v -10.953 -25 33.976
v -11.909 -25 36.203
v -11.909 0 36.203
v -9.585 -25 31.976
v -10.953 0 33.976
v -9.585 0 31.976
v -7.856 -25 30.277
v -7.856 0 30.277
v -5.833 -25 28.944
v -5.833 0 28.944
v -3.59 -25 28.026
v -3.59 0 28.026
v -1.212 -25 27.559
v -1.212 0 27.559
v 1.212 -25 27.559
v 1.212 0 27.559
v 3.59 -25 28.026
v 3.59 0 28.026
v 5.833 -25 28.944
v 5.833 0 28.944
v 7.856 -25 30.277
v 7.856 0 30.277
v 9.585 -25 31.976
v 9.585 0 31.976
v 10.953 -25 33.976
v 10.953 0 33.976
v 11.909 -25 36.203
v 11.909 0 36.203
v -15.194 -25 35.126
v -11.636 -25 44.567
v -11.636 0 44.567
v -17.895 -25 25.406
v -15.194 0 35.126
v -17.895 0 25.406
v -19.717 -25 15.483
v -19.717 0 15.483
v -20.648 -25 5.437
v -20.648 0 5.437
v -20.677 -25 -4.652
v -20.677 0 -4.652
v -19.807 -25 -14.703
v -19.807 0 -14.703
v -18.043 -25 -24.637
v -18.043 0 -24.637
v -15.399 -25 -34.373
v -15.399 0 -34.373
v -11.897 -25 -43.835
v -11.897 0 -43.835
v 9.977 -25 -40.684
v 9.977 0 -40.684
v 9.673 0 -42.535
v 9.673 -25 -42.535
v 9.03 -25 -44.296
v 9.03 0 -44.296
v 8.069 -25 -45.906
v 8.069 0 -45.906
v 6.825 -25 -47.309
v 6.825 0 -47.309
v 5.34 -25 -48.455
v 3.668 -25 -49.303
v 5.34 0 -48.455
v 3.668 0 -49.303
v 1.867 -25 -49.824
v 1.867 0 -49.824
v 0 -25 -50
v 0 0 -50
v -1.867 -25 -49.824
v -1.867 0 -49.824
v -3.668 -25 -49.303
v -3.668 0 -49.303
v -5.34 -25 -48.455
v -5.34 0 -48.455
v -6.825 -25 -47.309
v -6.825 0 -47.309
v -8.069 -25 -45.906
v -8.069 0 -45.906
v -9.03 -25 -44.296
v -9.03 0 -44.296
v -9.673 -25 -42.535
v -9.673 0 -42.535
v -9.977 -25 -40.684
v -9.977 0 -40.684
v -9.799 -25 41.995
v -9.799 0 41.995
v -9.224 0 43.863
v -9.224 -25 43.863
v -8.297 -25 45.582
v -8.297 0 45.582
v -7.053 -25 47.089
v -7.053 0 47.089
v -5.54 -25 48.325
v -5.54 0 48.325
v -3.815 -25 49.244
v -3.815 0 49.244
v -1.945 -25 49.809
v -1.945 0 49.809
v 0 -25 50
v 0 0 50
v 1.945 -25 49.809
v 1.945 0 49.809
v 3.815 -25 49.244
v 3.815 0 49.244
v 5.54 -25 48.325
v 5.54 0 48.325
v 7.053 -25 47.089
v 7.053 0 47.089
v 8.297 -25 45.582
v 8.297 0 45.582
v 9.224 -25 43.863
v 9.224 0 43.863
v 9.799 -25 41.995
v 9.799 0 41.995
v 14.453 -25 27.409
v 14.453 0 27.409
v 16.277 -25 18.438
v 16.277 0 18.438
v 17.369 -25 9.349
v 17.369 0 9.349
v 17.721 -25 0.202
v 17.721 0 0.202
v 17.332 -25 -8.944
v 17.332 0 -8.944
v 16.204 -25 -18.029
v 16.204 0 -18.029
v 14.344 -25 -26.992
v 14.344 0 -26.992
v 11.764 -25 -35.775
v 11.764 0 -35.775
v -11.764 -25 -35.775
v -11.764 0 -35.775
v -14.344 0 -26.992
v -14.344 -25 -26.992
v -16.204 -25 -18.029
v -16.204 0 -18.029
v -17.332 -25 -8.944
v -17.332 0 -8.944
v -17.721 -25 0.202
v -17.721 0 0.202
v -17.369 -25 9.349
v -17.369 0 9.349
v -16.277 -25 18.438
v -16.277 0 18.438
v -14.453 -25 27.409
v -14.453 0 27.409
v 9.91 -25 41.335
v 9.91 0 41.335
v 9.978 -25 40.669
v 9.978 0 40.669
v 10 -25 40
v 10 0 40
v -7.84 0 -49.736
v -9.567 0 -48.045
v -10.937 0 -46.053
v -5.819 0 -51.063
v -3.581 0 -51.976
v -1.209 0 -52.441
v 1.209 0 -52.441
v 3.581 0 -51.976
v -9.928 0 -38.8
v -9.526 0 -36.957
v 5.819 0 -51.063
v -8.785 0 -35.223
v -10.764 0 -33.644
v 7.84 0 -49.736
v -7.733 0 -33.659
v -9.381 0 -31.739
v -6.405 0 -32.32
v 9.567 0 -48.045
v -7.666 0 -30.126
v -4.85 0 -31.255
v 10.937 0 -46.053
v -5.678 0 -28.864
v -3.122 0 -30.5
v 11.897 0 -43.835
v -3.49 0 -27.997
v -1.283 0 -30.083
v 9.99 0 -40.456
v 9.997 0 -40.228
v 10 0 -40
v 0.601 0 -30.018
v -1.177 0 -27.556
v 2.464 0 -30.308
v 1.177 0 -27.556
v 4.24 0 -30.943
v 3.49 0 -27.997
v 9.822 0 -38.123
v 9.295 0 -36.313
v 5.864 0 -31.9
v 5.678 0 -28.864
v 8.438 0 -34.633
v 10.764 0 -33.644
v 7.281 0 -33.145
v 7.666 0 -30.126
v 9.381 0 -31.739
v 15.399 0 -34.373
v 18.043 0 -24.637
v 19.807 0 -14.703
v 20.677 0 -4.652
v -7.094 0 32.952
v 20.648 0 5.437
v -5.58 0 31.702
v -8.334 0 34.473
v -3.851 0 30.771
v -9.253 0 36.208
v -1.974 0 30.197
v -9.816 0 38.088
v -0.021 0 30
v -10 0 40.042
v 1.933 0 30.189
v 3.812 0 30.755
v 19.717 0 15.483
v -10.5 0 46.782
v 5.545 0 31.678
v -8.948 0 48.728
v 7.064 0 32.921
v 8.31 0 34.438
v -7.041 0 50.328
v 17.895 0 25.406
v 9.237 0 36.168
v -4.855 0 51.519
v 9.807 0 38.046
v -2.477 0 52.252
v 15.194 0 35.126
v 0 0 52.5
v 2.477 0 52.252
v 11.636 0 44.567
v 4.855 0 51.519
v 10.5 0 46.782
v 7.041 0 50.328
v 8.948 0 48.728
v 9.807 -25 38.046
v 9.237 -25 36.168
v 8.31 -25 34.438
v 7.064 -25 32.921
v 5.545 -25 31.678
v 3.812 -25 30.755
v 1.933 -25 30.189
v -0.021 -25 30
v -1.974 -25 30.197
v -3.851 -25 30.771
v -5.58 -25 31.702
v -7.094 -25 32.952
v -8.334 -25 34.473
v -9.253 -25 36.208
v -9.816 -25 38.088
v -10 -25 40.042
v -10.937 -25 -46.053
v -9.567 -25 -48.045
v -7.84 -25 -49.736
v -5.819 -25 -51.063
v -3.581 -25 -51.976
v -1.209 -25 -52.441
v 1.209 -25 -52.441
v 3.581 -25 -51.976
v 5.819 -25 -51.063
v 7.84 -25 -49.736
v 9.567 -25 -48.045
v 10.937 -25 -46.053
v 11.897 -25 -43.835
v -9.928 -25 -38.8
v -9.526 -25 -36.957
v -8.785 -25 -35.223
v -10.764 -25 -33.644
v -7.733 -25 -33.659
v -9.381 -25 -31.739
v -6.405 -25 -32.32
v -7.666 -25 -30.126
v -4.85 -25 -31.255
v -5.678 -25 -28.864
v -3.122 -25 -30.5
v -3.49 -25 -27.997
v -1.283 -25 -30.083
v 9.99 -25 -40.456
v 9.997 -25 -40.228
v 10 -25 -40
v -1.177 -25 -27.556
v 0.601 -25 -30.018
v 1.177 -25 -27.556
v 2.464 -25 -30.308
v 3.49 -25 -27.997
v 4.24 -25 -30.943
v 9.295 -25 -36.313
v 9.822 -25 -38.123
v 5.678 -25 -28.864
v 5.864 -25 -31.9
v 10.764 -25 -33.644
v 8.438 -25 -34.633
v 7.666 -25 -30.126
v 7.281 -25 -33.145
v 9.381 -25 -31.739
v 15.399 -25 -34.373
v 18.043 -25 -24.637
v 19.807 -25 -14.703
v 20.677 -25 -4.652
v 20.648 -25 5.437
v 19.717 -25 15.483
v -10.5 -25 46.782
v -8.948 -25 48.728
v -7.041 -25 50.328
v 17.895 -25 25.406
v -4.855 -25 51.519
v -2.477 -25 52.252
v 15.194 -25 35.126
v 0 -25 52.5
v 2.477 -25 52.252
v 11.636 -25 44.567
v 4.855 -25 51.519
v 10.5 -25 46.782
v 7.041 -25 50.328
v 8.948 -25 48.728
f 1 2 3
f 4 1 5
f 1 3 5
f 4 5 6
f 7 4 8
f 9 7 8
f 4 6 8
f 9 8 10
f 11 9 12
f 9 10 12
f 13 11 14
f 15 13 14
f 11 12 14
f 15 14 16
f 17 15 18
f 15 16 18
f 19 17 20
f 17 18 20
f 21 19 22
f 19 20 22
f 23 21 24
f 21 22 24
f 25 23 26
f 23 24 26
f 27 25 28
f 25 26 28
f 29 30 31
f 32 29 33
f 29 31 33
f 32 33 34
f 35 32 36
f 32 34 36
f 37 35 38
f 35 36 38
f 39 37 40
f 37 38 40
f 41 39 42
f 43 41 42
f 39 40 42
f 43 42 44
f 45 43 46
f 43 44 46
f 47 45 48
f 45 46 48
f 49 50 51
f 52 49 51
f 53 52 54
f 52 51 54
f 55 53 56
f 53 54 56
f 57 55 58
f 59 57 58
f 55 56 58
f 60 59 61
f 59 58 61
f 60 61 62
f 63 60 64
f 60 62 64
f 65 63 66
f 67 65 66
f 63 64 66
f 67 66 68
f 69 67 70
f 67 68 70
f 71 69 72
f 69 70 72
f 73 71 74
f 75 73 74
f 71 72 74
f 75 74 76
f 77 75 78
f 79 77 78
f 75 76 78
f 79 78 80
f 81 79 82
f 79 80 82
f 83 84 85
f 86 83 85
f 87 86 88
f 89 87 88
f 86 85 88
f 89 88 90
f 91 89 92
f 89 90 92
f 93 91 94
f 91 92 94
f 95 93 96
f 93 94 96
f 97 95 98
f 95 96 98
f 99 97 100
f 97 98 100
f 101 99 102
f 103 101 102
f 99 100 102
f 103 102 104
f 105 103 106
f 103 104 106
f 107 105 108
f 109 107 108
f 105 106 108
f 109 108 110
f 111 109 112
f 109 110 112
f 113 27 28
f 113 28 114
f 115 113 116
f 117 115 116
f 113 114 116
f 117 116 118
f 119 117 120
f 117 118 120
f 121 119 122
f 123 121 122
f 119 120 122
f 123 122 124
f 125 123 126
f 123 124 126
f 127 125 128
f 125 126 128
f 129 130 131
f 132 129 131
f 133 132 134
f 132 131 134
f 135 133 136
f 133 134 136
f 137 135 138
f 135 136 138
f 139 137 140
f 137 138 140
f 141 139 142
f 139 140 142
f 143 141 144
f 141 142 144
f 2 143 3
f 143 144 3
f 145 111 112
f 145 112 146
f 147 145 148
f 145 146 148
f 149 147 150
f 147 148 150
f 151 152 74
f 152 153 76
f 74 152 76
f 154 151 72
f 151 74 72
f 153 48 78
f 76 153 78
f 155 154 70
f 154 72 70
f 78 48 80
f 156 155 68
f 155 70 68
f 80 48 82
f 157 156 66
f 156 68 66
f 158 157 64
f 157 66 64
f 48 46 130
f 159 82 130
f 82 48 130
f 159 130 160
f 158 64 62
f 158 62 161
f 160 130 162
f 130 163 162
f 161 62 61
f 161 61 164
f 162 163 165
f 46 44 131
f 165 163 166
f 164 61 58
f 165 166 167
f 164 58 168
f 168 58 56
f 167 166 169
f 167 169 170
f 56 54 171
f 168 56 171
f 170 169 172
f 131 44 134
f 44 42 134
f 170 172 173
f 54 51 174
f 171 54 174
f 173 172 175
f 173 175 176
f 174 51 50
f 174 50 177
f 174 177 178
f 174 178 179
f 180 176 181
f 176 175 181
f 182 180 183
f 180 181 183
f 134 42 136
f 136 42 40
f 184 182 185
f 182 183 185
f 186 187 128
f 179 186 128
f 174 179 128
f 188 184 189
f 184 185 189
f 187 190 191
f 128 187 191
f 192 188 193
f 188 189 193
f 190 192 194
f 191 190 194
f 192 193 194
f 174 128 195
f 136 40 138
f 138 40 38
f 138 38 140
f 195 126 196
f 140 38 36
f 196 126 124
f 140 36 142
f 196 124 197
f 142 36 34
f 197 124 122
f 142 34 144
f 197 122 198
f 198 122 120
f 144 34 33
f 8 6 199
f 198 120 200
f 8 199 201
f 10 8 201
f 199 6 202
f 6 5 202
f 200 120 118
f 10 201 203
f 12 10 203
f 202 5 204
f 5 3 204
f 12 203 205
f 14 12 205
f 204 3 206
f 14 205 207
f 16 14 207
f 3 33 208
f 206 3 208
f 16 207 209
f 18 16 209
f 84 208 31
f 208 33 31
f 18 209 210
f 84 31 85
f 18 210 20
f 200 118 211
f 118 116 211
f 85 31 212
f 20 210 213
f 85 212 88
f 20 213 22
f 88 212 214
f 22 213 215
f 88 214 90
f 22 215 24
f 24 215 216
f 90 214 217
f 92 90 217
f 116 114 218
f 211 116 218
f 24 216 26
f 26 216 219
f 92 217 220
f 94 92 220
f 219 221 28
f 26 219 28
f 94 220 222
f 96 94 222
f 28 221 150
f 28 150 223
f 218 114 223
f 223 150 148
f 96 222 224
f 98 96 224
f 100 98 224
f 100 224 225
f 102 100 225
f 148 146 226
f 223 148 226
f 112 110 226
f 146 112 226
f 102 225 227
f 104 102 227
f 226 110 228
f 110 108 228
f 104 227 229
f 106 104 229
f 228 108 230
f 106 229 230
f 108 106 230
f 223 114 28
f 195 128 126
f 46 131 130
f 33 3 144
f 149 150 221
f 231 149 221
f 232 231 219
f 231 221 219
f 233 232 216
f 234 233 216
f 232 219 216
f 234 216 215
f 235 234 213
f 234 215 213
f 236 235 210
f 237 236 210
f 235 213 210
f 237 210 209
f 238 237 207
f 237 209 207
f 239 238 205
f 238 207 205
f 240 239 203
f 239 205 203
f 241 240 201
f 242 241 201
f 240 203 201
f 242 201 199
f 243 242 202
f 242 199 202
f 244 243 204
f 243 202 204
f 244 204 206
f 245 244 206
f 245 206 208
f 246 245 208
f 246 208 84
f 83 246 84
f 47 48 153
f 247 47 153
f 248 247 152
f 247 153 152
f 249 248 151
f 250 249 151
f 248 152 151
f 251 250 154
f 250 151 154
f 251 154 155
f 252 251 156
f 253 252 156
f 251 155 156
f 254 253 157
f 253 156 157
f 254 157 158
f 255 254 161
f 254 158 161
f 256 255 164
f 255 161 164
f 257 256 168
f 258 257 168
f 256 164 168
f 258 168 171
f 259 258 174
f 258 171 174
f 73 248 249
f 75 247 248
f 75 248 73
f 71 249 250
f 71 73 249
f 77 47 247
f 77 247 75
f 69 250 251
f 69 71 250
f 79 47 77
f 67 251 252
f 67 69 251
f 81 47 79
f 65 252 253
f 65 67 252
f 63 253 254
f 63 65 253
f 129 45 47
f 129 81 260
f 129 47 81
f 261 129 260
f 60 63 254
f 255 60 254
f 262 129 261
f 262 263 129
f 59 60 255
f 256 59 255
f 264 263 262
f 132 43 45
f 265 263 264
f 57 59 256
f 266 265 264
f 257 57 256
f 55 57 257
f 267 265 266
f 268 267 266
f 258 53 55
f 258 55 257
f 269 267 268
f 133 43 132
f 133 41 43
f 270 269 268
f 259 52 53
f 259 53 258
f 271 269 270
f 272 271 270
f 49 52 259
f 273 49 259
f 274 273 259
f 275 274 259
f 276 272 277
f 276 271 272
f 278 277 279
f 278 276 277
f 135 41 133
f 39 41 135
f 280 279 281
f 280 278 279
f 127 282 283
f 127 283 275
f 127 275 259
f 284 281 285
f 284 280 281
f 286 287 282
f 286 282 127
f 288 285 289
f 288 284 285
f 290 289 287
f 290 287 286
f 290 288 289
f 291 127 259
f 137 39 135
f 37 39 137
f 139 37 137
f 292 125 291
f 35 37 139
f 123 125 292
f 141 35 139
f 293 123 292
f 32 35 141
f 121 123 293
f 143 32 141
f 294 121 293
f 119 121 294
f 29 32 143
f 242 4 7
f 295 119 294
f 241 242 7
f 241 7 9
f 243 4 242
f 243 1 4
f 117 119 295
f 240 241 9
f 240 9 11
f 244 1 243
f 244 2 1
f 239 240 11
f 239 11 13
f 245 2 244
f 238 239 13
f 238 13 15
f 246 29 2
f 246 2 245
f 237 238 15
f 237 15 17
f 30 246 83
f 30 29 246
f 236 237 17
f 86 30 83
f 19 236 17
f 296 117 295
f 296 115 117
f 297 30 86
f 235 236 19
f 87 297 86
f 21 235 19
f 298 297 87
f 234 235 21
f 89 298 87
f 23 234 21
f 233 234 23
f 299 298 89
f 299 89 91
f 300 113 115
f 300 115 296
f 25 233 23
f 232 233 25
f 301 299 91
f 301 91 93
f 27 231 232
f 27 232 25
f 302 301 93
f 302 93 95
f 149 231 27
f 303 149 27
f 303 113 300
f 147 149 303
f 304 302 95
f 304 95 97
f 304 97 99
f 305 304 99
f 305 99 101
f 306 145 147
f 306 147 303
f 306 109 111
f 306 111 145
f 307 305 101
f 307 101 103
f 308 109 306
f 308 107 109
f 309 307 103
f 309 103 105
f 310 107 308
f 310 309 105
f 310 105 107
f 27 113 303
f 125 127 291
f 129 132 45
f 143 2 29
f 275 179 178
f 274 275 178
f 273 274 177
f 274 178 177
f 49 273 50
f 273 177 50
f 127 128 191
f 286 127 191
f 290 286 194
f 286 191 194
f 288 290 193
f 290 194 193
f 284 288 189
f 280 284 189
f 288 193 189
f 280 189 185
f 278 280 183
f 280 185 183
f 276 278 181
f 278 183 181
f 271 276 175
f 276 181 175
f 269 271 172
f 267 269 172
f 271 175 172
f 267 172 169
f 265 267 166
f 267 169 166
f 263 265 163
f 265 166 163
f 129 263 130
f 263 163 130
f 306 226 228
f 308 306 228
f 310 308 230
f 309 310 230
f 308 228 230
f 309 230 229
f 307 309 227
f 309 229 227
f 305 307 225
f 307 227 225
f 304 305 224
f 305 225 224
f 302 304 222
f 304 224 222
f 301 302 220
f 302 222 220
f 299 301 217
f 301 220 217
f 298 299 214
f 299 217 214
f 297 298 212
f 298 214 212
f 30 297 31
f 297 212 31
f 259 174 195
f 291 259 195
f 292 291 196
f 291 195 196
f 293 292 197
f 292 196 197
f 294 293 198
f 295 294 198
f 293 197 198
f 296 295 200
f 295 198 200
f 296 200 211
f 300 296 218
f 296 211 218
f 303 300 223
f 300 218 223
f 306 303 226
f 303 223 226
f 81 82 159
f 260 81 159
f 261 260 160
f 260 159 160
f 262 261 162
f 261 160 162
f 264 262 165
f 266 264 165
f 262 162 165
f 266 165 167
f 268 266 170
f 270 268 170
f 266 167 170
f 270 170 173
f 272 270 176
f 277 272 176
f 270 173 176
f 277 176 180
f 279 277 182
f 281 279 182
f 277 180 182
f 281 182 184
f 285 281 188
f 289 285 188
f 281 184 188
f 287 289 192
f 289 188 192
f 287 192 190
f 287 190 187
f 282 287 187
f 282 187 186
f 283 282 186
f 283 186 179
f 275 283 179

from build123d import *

# Parameters (mm, degrees)
F1_DEPTH = 25


with BuildPart() as f1:
    # F0 (on Front) → F1 (new body)
    with BuildSketch(Plane.XZ):
        with BuildLine():
            ThreePointArc((-9.7989449483, 41.9951636275), (0, 50), (9.7989449483, 41.9951636275))
            ThreePointArc((9.7989449483, 41.9951636275), (10.8936502514, 39.1134530116), (11.9093426036, 36.2029539443))
            ThreePointArc((11.9093426036, 36.2029539443), (12.3514530025, 38.0786440394), (12.5, 40))
            ThreePointArc((12.5, 40), (12.2820417112, 42.324102279), (11.6357677755, 44.5671553812))
            ThreePointArc((11.6357677755, 44.5671553812), (0, 52.5), (-11.6357677755, 44.5671553812))
            ThreePointArc((-11.6357677755, 44.5671553812), (-12.493319099, 40.4086292818), (-11.9093426036, 36.2029539443))
            ThreePointArc((-11.9093426036, 36.2029539443), (-10.8936502514, 39.1134530116), (-9.7989449483, 41.9951636275))
        make_face()
        with BuildLine():
            ThreePointArc((9.7989449483, 41.9951636275), (9.9496092758, 41.0026341599), (10, 40))
            ThreePointArc((10, 40), (-1.0026341599, 30.0503907242), (-9.7989449483, 41.9951636275))
            ThreePointArc((-9.7989449483, 41.9951636275), (-10.8936502514, 39.1134530116), (-11.9093426036, 36.2029539443))
            ThreePointArc((-11.9093426036, 36.2029539443), (0, 27.5), (11.9093426036, 36.2029539443))
            ThreePointArc((11.9093426036, 36.2029539443), (10.8936502514, 39.1134530116), (9.7989449483, 41.9951636275))
        make_face()
        with BuildLine():
            ThreePointArc((-11.7644333165, -35.7752977924), (-17.7211555757, 0.20198165), (-11.9093426036, 36.2029539443))
            ThreePointArc((-11.9093426036, 36.2029539443), (-12.493319099, 40.4086292818), (-11.6357677755, 44.5671553812))
            ThreePointArc((-11.6357677755, 44.5671553812), (-20.7751383707, 0.3927164788), (-11.89717505, -43.835000108))
            ThreePointArc((-11.89717505, -43.835000108), (-12.4983050041, -39.7941553412), (-11.7644333165, -35.7752977924))
        make_face()
        with BuildLine():
            ThreePointArc((12.5, -40), (12.3147354104, -37.8558703929), (11.7644333165, -35.7752977924))
            ThreePointArc((11.7644333165, -35.7752977924), (10.8988684939, -38.2401740248), (9.9765535789, -40.6843819744))
            ThreePointArc((9.9765535789, -40.6843819744), (0, -50), (-9.9765535789, -40.6843819744))
            ThreePointArc((-9.9765535789, -40.6843819744), (-10.8988684939, -38.2401740248), (-11.7644333165, -35.7752977924))
            ThreePointArc((-11.7644333165, -35.7752977924), (-12.4983050041, -39.7941553412), (-11.89717505, -43.835000108))
            ThreePointArc((-11.89717505, -43.835000108), (0, -52.5), (11.89717505, -43.835000108))
            ThreePointArc((11.89717505, -43.835000108), (12.3483741465, -41.9410450632), (12.5, -40))
        make_face()
        with BuildLine():
            ThreePointArc((9.9765535789, -40.6843819744), (10.8988684939, -38.2401740248), (11.7644333165, -35.7752977924))
            ThreePointArc((11.7644333165, -35.7752977924), (0, -27.5), (-11.7644333165, -35.7752977924))
            ThreePointArc((-11.7644333165, -35.7752977924), (-10.8988684939, -38.2401740248), (-9.9765535789, -40.6843819744))
            ThreePointArc((-9.9765535789, -40.6843819744), (-0.3423917426, -30.0058633242), (10, -40))
            ThreePointArc((10, -40), (9.9941366758, -40.3423917426), (9.9765535789, -40.6843819744))
        make_face()
        with BuildLine():
            ThreePointArc((12.5, 40), (12.3514530025, 38.0786440394), (11.9093426036, 36.2029539443))
            ThreePointArc((11.9093426036, 36.2029539443), (17.7211555757, 0.20198165), (11.7644333165, -35.7752977924))
            ThreePointArc((11.7644333165, -35.7752977924), (12.3147354104, -37.8558703929), (12.5, -40))
            ThreePointArc((12.5, -40), (12.3483741465, -41.9410450632), (11.89717505, -43.835000108))
            ThreePointArc((11.89717505, -43.835000108), (20.7751383707, 0.3927164788), (11.6357677755, 44.5671553812))
            ThreePointArc((11.6357677755, 44.5671553812), (12.2820417112, 42.324102279), (12.5, 40))
        make_face()
    extrude(amount=F1_DEPTH)


solid = f1.part
